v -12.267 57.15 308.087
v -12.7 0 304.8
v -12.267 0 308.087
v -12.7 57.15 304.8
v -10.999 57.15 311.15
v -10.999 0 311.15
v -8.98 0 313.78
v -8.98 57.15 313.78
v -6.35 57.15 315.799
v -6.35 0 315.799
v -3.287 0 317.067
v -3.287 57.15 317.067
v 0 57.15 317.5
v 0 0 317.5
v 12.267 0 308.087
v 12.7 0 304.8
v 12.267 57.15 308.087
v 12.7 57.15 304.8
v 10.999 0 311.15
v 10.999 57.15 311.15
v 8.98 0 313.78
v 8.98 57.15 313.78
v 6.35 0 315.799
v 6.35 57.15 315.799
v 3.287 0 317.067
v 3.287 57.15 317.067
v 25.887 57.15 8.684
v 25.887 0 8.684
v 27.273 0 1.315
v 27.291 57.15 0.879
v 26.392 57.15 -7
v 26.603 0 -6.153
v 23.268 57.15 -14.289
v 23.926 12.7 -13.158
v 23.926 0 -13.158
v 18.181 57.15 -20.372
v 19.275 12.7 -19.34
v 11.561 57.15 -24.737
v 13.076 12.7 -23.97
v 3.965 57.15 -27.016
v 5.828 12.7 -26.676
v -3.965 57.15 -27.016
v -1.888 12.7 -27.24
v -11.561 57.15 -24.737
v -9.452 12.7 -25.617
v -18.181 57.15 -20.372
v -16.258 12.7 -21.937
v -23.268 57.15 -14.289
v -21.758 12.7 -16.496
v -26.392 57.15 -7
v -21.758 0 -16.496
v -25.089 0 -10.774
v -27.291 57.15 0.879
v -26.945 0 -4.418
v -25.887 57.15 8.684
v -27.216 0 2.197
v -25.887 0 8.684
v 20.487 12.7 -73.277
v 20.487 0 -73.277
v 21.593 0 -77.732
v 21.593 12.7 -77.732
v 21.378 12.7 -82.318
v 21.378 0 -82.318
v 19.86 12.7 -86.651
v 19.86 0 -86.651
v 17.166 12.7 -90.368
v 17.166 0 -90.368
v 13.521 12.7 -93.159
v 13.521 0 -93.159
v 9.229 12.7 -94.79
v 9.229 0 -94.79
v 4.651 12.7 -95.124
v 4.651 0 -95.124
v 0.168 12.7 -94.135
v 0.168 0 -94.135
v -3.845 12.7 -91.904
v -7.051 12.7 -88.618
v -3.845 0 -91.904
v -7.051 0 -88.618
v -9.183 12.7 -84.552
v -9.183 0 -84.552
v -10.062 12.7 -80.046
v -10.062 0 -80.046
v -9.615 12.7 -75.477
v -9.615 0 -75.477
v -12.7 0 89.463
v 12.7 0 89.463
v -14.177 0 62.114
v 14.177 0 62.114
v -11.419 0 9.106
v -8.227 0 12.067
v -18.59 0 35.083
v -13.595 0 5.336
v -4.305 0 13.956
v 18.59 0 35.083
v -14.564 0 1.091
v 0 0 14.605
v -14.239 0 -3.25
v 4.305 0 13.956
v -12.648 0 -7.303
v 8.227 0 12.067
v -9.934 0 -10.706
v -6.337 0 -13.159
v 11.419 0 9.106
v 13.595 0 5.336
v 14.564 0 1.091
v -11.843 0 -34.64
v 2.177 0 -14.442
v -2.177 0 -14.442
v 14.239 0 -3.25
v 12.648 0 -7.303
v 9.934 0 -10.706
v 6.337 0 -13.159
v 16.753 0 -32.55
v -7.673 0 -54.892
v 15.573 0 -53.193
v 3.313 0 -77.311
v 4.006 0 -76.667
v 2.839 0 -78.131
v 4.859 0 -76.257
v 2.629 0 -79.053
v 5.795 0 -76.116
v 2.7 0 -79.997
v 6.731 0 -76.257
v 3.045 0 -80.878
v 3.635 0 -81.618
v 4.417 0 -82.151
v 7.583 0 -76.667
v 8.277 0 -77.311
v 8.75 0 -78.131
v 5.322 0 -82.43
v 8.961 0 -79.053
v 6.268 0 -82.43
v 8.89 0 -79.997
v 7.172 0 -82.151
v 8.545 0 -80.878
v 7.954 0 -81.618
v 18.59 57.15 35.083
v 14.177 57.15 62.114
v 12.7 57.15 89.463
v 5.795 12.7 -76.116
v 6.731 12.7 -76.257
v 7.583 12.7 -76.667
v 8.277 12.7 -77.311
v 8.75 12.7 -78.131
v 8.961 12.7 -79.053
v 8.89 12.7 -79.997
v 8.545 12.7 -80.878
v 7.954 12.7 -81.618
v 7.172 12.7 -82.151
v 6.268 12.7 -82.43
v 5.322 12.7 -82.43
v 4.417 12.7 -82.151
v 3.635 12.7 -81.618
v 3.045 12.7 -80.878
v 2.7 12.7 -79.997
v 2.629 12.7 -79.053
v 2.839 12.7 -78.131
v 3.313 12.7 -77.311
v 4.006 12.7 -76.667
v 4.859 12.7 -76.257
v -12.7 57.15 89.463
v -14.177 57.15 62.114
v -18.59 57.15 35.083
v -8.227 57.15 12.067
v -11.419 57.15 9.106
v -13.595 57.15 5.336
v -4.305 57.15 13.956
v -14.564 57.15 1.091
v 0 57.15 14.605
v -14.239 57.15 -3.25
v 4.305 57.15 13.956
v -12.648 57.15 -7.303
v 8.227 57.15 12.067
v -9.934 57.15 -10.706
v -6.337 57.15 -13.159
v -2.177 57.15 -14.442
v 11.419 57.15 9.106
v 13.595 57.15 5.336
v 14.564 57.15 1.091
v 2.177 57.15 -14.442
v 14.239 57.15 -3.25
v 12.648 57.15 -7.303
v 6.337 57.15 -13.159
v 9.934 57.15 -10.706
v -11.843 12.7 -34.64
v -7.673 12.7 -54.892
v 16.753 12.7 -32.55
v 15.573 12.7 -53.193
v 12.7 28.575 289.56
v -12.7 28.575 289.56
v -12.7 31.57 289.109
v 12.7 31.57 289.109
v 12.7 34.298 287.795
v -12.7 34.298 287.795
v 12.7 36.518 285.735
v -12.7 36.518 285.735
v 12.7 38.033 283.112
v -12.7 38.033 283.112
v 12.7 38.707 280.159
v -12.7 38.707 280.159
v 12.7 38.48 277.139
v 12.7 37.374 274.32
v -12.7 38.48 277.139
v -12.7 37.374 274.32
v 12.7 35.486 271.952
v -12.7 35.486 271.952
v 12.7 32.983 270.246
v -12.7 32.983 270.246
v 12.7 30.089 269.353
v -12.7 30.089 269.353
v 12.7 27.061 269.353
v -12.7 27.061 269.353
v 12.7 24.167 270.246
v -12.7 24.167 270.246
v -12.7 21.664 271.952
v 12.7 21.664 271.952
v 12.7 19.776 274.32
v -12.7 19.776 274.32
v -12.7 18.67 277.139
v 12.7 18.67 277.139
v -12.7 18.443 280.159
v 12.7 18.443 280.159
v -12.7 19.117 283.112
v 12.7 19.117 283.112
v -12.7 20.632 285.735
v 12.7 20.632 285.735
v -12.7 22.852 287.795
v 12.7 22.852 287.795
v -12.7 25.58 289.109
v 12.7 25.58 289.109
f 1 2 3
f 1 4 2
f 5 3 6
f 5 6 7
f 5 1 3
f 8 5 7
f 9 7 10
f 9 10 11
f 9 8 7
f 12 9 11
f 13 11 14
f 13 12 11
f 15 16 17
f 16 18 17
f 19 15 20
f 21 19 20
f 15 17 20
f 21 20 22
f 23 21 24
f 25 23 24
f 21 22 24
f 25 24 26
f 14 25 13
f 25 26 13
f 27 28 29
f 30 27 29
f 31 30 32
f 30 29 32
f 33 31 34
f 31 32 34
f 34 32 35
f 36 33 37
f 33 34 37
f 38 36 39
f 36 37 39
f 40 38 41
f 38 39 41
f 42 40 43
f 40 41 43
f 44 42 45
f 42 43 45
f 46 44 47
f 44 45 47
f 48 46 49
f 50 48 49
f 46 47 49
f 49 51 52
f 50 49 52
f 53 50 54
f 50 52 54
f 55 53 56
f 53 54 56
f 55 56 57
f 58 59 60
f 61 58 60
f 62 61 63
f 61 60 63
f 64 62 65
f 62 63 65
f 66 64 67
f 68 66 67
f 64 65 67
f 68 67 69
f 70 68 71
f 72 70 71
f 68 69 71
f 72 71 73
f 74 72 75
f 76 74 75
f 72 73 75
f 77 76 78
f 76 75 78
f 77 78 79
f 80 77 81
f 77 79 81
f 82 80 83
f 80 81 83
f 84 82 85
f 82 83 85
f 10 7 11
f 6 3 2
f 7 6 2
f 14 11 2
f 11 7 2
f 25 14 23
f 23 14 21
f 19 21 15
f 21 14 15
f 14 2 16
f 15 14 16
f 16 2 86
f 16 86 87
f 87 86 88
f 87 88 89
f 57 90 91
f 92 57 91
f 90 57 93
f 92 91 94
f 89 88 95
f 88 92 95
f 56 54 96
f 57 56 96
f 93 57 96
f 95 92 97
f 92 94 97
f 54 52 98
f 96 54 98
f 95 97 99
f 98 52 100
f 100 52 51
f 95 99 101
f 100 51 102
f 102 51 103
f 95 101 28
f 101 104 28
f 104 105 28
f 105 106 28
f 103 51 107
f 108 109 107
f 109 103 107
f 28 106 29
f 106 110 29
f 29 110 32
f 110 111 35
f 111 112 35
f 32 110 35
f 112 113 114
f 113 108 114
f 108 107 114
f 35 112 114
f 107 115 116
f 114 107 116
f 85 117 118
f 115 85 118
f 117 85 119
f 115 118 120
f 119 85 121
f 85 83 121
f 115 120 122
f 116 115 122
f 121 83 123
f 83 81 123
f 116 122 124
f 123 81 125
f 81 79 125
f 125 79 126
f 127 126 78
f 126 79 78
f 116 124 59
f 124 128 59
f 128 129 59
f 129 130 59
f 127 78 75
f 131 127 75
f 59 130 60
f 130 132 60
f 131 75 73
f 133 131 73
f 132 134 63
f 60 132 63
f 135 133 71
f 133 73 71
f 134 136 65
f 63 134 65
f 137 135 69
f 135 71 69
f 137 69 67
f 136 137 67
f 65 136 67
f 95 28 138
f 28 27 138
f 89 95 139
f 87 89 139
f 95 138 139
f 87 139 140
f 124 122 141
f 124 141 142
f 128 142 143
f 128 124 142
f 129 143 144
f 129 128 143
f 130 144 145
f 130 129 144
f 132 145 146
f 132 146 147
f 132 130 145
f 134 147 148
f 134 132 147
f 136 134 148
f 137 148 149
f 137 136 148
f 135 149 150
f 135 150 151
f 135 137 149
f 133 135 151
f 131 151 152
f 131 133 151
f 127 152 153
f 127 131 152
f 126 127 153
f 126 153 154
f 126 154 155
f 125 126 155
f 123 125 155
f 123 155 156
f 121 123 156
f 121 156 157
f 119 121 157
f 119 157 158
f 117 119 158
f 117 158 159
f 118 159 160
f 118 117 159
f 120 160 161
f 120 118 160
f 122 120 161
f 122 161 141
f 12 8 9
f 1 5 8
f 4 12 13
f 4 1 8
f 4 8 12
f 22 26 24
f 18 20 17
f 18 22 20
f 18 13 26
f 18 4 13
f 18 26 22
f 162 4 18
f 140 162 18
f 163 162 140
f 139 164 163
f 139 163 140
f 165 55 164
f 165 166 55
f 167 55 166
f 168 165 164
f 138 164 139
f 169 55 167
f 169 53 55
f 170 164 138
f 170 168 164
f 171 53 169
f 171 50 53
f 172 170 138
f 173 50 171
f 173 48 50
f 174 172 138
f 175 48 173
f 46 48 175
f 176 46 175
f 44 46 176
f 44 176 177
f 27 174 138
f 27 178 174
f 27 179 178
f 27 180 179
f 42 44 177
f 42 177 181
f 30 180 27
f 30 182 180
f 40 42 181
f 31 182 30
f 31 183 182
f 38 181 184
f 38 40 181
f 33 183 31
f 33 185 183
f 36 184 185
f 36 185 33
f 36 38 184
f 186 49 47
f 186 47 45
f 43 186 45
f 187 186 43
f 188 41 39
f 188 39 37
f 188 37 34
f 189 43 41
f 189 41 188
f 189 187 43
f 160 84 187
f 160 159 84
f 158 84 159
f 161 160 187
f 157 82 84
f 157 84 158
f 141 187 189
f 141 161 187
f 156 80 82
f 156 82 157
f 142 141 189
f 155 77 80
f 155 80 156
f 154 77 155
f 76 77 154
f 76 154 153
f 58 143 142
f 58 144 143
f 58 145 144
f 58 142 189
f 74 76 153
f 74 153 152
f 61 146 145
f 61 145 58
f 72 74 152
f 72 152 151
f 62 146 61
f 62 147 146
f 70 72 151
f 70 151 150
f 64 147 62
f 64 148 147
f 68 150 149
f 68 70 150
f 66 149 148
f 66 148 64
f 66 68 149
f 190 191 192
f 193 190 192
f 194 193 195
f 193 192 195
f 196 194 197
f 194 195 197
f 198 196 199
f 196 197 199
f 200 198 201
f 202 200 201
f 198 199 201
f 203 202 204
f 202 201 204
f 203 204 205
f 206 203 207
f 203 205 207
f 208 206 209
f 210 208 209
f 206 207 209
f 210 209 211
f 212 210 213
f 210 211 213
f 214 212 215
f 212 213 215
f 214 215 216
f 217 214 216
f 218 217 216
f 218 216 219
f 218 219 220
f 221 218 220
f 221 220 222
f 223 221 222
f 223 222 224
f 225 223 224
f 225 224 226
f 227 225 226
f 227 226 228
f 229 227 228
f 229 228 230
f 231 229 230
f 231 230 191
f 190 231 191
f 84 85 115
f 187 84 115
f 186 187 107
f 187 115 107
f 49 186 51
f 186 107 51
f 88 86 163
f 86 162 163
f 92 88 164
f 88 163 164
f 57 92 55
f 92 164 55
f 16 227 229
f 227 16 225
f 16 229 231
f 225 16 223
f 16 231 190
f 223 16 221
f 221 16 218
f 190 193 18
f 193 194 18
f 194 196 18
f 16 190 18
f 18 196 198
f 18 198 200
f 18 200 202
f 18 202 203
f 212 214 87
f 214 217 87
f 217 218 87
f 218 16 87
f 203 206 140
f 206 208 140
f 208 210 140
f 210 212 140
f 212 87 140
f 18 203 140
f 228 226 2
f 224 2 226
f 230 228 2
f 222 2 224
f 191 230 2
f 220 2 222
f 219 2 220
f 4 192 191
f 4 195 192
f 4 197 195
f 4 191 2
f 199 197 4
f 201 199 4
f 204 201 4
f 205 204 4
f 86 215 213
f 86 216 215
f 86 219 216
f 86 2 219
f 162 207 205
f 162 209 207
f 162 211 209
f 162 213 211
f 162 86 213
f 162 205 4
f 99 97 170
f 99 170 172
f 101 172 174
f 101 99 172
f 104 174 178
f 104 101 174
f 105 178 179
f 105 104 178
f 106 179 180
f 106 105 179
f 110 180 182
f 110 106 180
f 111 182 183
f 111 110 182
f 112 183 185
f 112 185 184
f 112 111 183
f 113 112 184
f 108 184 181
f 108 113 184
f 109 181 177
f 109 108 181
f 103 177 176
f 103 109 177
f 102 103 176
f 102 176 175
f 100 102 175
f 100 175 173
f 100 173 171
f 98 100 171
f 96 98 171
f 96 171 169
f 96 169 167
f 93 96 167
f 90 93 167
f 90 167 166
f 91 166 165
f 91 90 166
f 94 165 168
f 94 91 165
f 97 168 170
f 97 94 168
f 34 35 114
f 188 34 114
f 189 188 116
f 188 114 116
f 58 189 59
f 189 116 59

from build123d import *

# Parameters (mm, degrees)
SKETCH1_R           = 14.605
BOSS_EXTRUDE1_DEPTH = 57.15
FILLET1_R           = 254
SKETCH2_R           = 10.16
CUT_EXTRUDE1_DEPTH  = 313.681247479
SKETCH8_R           = 3.175
BOSS_EXTRUDE6_DEPTH = 12.7
SKETCH9_W           = 25.4
SKETCH9_H           = 57.15
BOSS_EXTRUDE7_DEPTH = 12.7
FILLET2_R           = 12.7


with BuildPart() as part:
    # Sketch1 → Boss-Extrude1 (new body)
    with BuildSketch(Plane(origin=(0, 0, 0), x_dir=(1, 0, 0), z_dir=(0, 1, 0))):
        with BuildLine():
            Line((-12.7, -24.171740215), (-12.7, -304.8))
            Line((-12.7, -304.8), (12.7, -304.8))
            Line((12.7, -304.8), (12.7, -24.171740215))
            ThreePointArc((12.7, -24.171740215), (0, 27.305), (-12.7, -24.171740215))
        make_face()
        with Locations(Location((0, 0, 0), (0, 0, 270))):
            Circle(SKETCH1_R, mode=Mode.SUBTRACT)
    extrude(amount=BOSS_EXTRUDE1_DEPTH)

    # Fillet1
    fillet1_edges = [part.edges().sort_by_distance(p)[0] for p in [
        (12.7, 28.575, 24.171740215),
        (-12.7, 28.575, 24.171740215),
    ]]
    fillet(fillet1_edges, radius=FILLET1_R)

    # Sketch2 → Cut-Extrude1 (cut, through all)
    with BuildSketch(Plane.ZY.offset(12.7)):
        with Locations((279.4, 28.575)):
            Circle(SKETCH2_R)
    extrude(amount=-CUT_EXTRUDE1_DEPTH, mode=Mode.SUBTRACT)

    # Sketch8 → Boss-Extrude6 (add)
    with BuildSketch(Plane(origin=(0, 0, 0), x_dir=(1, 0, 0), z_dir=(0, 1, 0))):
        with BuildLine():
            ThreePointArc((20.48678387, 73.276843268), (6.952035658, 95.123295408), (-9.615200393, 75.476830843))
            ThreePointArc((-9.615200393, 75.476830843), (-9.004649416, 44.610856641), (-21.758468792, 16.496425698))
            ThreePointArc((-21.758468792, 16.496425698), (1.990263204, 27.232368193), (23.925719089, 13.157621026))
            ThreePointArc((23.925719089, 13.157621026), (15.395044016, 42.827617971), (20.48678387, 73.276843268))
        make_face()
        with Locations(Location((5.794905888, 79.290523203, 0), (0, 0, 270))):
            Circle(SKETCH8_R, mode=Mode.SUBTRACT)
    extrude(amount=BOSS_EXTRUDE6_DEPTH)

    # Sketch9 → Boss-Extrude7 (add)
    with BuildSketch(Plane.XY.offset(304.8)):
        with Locations((0, 28.575)):
            Rectangle(SKETCH9_W, SKETCH9_H)
    extrude(amount=BOSS_EXTRUDE7_DEPTH)

    # Fillet2
    fillet2_edges = [part.edges().sort_by_distance(p)[0] for p in [
        (-12.7, 28.575, 317.5),
        (12.7, 28.575, 317.5),
    ]]
    fillet(fillet2_edges, radius=FILLET2_R - 0.0001)  # a hair under: the kernel refuses the full size


solid = part.part
